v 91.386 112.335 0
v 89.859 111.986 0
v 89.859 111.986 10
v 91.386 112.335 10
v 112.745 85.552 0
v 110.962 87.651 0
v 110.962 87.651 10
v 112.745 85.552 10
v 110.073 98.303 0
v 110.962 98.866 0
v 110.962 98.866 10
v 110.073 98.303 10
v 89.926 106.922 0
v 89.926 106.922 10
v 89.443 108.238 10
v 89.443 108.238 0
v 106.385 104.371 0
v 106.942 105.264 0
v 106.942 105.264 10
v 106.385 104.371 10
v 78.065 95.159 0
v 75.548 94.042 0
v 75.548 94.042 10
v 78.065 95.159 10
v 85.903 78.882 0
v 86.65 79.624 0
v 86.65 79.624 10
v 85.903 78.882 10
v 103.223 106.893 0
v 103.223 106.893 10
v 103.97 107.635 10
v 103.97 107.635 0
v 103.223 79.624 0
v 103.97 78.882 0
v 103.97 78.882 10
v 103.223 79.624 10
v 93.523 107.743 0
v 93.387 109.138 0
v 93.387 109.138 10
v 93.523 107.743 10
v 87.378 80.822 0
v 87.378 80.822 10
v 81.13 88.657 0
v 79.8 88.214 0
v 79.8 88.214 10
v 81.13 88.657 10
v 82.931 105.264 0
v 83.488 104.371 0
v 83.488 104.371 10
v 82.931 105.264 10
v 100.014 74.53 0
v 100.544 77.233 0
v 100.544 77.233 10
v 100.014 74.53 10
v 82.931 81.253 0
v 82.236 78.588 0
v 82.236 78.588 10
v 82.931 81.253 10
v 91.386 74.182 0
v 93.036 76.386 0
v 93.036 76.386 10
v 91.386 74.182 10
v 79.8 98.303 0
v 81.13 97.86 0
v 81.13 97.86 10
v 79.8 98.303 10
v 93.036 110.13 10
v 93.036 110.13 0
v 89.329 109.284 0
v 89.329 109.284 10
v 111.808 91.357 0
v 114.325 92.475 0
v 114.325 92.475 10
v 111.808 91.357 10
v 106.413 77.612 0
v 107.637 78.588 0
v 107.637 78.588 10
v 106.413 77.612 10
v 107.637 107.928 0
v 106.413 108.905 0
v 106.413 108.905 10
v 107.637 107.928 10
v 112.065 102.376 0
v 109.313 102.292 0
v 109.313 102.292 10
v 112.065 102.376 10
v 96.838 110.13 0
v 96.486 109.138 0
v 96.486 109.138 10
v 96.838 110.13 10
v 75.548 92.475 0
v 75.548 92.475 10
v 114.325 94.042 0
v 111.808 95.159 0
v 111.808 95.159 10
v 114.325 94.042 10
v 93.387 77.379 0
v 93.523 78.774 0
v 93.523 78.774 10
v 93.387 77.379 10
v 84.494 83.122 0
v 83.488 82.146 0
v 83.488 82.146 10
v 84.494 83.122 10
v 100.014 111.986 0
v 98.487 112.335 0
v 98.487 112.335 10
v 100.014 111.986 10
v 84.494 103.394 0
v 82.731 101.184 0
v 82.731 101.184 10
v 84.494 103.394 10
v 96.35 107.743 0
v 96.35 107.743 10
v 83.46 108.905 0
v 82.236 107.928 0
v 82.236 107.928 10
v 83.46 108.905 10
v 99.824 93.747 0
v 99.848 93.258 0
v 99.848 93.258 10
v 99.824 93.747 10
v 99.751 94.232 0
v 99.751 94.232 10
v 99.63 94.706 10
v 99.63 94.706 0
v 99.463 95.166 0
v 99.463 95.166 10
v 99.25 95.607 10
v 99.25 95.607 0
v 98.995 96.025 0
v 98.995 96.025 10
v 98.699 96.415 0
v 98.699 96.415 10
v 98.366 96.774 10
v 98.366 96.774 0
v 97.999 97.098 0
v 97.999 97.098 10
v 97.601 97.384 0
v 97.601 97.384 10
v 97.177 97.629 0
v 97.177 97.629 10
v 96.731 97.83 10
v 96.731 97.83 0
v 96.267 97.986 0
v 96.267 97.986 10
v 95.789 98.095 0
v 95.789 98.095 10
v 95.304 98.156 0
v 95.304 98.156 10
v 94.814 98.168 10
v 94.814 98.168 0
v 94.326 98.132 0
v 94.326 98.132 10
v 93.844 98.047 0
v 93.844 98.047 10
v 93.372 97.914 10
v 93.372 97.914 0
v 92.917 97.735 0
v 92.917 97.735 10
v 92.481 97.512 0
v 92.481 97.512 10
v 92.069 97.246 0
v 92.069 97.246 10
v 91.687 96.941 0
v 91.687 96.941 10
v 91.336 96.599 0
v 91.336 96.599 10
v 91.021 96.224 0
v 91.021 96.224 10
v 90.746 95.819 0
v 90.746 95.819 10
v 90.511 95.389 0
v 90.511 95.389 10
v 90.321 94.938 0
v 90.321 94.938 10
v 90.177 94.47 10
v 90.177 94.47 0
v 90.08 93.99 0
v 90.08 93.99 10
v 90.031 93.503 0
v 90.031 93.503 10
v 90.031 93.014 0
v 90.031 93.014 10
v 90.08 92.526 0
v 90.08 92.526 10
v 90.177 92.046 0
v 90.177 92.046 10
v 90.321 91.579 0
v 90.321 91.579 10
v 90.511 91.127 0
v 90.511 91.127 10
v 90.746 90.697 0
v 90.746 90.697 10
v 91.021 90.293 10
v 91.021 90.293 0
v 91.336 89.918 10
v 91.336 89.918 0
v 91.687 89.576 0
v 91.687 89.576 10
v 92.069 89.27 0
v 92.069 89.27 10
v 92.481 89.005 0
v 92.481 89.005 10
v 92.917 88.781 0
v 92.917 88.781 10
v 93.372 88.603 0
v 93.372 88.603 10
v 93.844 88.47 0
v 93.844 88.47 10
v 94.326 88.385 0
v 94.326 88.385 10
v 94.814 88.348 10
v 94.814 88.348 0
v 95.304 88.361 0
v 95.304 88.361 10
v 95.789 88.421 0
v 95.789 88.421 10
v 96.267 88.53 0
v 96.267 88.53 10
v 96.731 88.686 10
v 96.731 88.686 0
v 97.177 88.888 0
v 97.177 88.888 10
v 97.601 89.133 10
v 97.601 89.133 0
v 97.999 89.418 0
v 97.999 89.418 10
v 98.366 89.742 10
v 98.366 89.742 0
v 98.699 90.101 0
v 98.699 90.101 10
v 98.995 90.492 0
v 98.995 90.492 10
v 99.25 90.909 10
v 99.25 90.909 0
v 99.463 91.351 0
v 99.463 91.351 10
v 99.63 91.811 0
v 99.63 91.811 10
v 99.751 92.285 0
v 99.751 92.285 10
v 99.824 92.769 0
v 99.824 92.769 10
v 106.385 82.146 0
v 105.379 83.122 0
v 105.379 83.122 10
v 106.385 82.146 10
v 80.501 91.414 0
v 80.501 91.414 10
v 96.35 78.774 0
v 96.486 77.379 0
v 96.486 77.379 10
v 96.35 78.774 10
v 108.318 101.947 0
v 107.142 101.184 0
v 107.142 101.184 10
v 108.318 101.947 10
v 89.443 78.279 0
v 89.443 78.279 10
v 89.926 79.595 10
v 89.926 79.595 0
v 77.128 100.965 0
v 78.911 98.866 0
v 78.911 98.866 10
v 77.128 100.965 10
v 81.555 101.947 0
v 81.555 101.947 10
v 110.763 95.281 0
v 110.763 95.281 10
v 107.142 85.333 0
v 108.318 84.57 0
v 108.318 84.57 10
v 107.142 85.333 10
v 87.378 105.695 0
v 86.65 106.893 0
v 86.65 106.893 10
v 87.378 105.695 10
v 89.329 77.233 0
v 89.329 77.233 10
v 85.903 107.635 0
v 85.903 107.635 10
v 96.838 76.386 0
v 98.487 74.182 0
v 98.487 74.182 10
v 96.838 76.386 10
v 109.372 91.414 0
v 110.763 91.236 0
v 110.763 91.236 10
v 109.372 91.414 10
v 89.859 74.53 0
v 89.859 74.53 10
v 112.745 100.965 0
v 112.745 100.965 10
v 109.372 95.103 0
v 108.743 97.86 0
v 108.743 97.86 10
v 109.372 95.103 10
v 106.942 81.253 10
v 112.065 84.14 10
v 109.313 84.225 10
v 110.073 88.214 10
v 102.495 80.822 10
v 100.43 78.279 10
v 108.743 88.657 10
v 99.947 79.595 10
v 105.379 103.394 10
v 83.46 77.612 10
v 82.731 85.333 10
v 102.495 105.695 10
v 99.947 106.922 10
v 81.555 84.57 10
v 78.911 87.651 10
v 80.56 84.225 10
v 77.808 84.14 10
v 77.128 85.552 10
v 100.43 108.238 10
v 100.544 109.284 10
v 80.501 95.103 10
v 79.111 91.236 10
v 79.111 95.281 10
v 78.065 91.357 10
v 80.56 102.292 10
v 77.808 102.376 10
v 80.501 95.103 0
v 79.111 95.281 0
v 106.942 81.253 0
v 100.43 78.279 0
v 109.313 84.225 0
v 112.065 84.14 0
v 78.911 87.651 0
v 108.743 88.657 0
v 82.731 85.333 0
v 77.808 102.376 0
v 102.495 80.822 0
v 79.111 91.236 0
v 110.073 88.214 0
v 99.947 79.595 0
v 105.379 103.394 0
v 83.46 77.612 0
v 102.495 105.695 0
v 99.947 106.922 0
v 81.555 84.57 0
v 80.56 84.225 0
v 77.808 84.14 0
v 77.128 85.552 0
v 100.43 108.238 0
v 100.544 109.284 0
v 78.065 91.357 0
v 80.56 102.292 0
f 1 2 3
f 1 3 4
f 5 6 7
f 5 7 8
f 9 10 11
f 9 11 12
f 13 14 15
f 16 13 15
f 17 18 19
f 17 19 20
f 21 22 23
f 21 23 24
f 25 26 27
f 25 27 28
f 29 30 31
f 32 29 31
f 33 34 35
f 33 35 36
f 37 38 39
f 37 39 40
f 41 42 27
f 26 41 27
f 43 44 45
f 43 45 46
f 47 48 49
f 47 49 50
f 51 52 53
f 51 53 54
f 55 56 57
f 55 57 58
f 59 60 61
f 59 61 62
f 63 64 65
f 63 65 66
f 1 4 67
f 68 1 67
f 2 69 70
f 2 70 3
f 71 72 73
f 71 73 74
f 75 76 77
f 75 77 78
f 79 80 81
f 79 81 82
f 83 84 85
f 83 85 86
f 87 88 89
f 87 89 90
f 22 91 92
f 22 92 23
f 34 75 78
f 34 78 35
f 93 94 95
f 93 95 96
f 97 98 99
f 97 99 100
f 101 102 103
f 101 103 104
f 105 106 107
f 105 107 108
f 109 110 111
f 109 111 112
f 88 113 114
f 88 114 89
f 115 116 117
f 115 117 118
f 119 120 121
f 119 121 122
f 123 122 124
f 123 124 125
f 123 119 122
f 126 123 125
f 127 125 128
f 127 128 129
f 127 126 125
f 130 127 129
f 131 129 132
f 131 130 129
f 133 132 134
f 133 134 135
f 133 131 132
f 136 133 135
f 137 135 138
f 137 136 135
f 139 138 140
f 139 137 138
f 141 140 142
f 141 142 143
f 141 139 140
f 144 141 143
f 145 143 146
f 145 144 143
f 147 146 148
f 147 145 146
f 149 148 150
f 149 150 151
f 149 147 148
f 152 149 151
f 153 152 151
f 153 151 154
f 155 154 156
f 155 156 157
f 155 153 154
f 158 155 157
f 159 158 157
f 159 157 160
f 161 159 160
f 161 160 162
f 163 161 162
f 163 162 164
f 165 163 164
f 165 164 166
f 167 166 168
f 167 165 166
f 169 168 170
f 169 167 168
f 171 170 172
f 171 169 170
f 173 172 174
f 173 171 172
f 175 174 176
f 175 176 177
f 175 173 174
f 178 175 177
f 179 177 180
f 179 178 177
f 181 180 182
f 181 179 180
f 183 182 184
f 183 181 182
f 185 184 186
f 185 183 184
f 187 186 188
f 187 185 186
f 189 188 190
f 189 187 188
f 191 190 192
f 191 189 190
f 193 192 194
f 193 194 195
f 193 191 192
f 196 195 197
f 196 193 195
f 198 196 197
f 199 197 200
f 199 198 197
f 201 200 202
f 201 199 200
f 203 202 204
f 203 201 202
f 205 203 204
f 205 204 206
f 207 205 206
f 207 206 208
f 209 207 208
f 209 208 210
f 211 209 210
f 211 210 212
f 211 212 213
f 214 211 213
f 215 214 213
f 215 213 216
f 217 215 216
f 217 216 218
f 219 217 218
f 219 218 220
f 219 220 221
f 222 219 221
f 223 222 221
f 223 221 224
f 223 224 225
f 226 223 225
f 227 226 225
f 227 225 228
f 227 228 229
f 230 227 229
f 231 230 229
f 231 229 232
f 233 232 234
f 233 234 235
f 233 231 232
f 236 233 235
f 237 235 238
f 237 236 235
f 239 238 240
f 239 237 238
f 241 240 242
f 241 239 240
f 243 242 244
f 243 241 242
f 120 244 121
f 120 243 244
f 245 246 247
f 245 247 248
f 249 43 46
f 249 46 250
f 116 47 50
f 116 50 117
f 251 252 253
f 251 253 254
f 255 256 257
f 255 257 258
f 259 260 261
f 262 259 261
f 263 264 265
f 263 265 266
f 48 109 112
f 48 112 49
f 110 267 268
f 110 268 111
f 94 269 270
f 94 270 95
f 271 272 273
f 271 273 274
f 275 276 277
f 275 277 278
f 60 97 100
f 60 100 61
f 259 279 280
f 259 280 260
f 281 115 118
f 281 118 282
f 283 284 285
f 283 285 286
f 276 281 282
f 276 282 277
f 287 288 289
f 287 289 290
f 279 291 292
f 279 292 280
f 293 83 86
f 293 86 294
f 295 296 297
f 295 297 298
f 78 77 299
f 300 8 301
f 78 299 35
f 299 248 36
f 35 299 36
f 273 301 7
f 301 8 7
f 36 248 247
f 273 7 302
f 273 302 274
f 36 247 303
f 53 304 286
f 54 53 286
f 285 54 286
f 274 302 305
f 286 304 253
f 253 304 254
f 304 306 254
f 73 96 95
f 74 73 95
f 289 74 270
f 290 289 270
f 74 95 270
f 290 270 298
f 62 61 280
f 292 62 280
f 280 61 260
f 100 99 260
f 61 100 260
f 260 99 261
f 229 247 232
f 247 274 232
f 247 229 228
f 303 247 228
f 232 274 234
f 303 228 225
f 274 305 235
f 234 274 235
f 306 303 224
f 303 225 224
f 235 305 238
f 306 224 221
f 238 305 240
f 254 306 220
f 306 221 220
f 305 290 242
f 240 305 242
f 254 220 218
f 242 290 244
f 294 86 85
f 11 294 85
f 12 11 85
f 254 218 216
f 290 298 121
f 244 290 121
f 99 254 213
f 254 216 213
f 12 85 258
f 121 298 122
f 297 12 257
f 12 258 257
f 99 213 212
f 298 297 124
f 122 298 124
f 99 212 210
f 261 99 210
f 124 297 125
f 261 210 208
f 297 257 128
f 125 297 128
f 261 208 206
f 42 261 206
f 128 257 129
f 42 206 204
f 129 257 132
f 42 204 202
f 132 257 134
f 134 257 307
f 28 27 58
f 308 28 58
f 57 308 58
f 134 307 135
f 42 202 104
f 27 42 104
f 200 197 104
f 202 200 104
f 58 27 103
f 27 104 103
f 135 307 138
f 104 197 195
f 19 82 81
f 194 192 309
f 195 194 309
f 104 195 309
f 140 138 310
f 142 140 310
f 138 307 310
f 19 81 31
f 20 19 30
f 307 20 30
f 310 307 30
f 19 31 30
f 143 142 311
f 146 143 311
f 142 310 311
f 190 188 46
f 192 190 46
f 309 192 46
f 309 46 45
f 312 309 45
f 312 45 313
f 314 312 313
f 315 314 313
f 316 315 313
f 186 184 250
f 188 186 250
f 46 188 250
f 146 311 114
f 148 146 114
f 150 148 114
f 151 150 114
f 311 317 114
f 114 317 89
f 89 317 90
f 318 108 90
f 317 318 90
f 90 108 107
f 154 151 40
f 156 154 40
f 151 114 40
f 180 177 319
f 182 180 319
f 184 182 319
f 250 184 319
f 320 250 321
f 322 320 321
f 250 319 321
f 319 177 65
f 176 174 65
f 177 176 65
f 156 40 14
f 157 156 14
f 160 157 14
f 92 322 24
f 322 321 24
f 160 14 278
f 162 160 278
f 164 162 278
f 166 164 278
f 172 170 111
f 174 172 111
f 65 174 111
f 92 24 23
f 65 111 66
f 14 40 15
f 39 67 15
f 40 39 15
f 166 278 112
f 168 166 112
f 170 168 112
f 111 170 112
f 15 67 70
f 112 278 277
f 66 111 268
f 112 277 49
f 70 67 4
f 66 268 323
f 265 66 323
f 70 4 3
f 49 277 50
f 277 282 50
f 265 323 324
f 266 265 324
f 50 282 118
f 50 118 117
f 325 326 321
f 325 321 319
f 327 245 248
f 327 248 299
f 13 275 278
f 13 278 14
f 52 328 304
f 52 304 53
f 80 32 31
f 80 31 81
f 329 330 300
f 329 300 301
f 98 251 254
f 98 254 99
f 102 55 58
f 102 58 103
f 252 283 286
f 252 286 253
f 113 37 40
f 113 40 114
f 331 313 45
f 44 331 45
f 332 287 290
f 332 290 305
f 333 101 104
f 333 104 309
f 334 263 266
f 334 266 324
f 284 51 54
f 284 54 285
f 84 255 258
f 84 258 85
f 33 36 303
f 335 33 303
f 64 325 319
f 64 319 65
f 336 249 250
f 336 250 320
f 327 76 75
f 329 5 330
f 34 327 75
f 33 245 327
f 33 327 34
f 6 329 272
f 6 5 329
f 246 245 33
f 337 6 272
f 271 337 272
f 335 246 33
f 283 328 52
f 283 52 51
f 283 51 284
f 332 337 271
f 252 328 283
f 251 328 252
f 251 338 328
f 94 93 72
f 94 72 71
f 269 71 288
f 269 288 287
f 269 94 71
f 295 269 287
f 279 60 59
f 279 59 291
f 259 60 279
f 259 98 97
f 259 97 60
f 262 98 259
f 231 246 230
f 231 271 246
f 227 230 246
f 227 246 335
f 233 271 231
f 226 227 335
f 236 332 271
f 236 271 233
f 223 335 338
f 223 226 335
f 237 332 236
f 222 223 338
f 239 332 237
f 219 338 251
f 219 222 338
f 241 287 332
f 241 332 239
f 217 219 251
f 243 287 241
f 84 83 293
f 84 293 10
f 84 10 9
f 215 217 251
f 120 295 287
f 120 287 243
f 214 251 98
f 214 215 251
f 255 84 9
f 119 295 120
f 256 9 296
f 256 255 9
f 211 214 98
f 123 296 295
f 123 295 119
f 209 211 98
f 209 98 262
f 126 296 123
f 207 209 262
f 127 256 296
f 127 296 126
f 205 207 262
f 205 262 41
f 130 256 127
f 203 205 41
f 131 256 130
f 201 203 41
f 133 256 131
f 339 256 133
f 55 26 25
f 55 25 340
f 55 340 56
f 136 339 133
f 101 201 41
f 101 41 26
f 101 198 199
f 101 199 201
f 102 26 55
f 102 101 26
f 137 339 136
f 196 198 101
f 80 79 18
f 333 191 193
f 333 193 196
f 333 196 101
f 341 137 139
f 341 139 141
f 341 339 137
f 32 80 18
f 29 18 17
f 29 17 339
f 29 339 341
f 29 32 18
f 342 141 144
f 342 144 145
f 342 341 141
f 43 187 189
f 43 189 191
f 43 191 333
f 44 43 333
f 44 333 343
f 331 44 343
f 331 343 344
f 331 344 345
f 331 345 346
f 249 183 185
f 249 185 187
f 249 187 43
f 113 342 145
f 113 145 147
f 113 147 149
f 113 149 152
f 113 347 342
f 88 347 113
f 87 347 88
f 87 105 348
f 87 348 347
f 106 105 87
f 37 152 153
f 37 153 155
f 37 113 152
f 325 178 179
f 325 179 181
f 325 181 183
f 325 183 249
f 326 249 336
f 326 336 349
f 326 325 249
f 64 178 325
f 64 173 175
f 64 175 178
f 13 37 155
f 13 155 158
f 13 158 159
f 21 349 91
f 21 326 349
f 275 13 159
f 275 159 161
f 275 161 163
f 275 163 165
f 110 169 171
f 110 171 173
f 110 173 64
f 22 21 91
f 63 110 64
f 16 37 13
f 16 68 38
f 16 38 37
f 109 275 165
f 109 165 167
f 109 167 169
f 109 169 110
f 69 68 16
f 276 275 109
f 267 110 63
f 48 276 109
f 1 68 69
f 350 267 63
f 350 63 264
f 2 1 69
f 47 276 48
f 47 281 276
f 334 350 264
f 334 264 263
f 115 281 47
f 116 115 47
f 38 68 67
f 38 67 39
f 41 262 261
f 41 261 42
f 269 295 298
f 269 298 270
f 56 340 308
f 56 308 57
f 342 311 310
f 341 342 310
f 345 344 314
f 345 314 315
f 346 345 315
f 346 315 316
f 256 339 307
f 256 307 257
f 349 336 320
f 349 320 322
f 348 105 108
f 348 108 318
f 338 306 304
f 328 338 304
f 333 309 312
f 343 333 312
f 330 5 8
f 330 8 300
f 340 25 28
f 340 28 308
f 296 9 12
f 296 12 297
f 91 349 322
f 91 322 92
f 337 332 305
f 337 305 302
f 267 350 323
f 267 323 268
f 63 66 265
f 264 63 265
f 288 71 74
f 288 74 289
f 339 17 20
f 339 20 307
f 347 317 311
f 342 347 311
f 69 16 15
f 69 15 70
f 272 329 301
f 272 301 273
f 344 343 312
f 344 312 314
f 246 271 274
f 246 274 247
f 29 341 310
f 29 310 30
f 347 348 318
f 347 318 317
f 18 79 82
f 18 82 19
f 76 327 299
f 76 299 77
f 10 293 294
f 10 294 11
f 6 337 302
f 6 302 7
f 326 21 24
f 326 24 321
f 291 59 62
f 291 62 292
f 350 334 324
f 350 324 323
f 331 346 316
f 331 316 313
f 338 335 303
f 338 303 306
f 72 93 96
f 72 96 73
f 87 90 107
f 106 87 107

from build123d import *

# Parameters (mm, degrees)
MODEL_R             = 4.911595
BOSS_EXTRUDE1_DEPTH = 10


with BuildPart() as part:
    # Model → Boss-Extrude1 (new body)
    with BuildSketch(Plane.XY):
        Polygon((109.372327, 95.103157), (110.762604, 95.280824), (111.808486, 95.159378), (114.324954, 94.041578), (114.324954, 92.475166), (111.808486, 91.357365), (110.762604, 91.235919), (109.372327, 91.413587), (108.74316, 88.657038), (110.072845, 88.213892), (110.96246, 87.650678), (112.744724, 85.551724), (112.065082, 84.140432), (109.312829, 84.225186), (108.317826, 84.569557), (107.142317, 85.332849), (105.379438, 83.122268), (106.385168, 82.146081), (106.942314, 81.252653), (107.637374, 78.588263), (106.412702, 77.611622), (103.96978, 78.882138), (103.222733, 79.62412), (102.494814, 80.821857), (99.94738, 79.59508), (100.42996, 78.279193), (100.544289, 77.232507), (100.014481, 74.530399), (98.48734, 74.18184), (96.837602, 76.386481), (96.486466, 77.379116), (96.350314, 78.774073), (93.522876, 78.774073), (93.386724, 77.379116), (93.035588, 76.386481), (91.38585, 74.18184), (89.858709, 74.530399), (89.328902, 77.232507), (89.44323, 78.279193), (89.92581, 79.59508), (87.378376, 80.821857), (86.650457, 79.62412), (85.90341, 78.882138), (83.460488, 77.611622), (82.235816, 78.588263), (82.930876, 81.252653), (83.488022, 82.146081), (84.493752, 83.122268), (82.730873, 85.332849), (81.555364, 84.569557), (80.560362, 84.225186), (77.808108, 84.140432), (77.128466, 85.551724), (78.91073, 87.650678), (79.800346, 88.213892), (81.13003, 88.657038), (80.500863, 91.413587), (79.110586, 91.235919), (78.064704, 91.357365), (75.548236, 92.475166), (75.548236, 94.041578), (78.064704, 95.159378), (79.110586, 95.280824), (80.500863, 95.103157), (81.13003, 97.859706), (79.800346, 98.302851), (78.91073, 98.866065), (77.128466, 100.96502), (77.808108, 102.376311), (80.560362, 102.291557), (81.555364, 101.947187), (82.730873, 101.183894), (84.493752, 103.394476), (83.488022, 104.370663), (82.930876, 105.264091), (82.235816, 107.928481), (83.460488, 108.905122), (85.90341, 107.634605), (86.650457, 106.892623), (87.378376, 105.694886), (89.92581, 106.921664), (89.44323, 108.237551), (89.328902, 109.284237), (89.858709, 111.986345), (91.38585, 112.334904), (93.035588, 110.130263), (93.386724, 109.137628), (93.522876, 107.742671), (96.350314, 107.742671), (96.486466, 109.137628), (96.837602, 110.130263), (98.48734, 112.334904), (100.014481, 111.986345), (100.544289, 109.284237), (100.42996, 108.237551), (99.94738, 106.921664), (102.494814, 105.694886), (103.222733, 106.892623), (103.96978, 107.634605), (106.412702, 108.905122), (107.637374, 107.928481), (106.942314, 105.264091), (106.385168, 104.370663), (105.379438, 103.394476), (107.142317, 101.183894), (108.317826, 101.947187), (109.312829, 102.291557), (112.065082, 102.376311), (112.744724, 100.96502), (110.96246, 98.866065), (110.072845, 98.302851), (108.74316, 97.859706), align=None)
        with Locations((94.936589262, 93.258379)):
            Circle(MODEL_R, mode=Mode.SUBTRACT)
    extrude(amount=BOSS_EXTRUDE1_DEPTH)


solid = part.part
